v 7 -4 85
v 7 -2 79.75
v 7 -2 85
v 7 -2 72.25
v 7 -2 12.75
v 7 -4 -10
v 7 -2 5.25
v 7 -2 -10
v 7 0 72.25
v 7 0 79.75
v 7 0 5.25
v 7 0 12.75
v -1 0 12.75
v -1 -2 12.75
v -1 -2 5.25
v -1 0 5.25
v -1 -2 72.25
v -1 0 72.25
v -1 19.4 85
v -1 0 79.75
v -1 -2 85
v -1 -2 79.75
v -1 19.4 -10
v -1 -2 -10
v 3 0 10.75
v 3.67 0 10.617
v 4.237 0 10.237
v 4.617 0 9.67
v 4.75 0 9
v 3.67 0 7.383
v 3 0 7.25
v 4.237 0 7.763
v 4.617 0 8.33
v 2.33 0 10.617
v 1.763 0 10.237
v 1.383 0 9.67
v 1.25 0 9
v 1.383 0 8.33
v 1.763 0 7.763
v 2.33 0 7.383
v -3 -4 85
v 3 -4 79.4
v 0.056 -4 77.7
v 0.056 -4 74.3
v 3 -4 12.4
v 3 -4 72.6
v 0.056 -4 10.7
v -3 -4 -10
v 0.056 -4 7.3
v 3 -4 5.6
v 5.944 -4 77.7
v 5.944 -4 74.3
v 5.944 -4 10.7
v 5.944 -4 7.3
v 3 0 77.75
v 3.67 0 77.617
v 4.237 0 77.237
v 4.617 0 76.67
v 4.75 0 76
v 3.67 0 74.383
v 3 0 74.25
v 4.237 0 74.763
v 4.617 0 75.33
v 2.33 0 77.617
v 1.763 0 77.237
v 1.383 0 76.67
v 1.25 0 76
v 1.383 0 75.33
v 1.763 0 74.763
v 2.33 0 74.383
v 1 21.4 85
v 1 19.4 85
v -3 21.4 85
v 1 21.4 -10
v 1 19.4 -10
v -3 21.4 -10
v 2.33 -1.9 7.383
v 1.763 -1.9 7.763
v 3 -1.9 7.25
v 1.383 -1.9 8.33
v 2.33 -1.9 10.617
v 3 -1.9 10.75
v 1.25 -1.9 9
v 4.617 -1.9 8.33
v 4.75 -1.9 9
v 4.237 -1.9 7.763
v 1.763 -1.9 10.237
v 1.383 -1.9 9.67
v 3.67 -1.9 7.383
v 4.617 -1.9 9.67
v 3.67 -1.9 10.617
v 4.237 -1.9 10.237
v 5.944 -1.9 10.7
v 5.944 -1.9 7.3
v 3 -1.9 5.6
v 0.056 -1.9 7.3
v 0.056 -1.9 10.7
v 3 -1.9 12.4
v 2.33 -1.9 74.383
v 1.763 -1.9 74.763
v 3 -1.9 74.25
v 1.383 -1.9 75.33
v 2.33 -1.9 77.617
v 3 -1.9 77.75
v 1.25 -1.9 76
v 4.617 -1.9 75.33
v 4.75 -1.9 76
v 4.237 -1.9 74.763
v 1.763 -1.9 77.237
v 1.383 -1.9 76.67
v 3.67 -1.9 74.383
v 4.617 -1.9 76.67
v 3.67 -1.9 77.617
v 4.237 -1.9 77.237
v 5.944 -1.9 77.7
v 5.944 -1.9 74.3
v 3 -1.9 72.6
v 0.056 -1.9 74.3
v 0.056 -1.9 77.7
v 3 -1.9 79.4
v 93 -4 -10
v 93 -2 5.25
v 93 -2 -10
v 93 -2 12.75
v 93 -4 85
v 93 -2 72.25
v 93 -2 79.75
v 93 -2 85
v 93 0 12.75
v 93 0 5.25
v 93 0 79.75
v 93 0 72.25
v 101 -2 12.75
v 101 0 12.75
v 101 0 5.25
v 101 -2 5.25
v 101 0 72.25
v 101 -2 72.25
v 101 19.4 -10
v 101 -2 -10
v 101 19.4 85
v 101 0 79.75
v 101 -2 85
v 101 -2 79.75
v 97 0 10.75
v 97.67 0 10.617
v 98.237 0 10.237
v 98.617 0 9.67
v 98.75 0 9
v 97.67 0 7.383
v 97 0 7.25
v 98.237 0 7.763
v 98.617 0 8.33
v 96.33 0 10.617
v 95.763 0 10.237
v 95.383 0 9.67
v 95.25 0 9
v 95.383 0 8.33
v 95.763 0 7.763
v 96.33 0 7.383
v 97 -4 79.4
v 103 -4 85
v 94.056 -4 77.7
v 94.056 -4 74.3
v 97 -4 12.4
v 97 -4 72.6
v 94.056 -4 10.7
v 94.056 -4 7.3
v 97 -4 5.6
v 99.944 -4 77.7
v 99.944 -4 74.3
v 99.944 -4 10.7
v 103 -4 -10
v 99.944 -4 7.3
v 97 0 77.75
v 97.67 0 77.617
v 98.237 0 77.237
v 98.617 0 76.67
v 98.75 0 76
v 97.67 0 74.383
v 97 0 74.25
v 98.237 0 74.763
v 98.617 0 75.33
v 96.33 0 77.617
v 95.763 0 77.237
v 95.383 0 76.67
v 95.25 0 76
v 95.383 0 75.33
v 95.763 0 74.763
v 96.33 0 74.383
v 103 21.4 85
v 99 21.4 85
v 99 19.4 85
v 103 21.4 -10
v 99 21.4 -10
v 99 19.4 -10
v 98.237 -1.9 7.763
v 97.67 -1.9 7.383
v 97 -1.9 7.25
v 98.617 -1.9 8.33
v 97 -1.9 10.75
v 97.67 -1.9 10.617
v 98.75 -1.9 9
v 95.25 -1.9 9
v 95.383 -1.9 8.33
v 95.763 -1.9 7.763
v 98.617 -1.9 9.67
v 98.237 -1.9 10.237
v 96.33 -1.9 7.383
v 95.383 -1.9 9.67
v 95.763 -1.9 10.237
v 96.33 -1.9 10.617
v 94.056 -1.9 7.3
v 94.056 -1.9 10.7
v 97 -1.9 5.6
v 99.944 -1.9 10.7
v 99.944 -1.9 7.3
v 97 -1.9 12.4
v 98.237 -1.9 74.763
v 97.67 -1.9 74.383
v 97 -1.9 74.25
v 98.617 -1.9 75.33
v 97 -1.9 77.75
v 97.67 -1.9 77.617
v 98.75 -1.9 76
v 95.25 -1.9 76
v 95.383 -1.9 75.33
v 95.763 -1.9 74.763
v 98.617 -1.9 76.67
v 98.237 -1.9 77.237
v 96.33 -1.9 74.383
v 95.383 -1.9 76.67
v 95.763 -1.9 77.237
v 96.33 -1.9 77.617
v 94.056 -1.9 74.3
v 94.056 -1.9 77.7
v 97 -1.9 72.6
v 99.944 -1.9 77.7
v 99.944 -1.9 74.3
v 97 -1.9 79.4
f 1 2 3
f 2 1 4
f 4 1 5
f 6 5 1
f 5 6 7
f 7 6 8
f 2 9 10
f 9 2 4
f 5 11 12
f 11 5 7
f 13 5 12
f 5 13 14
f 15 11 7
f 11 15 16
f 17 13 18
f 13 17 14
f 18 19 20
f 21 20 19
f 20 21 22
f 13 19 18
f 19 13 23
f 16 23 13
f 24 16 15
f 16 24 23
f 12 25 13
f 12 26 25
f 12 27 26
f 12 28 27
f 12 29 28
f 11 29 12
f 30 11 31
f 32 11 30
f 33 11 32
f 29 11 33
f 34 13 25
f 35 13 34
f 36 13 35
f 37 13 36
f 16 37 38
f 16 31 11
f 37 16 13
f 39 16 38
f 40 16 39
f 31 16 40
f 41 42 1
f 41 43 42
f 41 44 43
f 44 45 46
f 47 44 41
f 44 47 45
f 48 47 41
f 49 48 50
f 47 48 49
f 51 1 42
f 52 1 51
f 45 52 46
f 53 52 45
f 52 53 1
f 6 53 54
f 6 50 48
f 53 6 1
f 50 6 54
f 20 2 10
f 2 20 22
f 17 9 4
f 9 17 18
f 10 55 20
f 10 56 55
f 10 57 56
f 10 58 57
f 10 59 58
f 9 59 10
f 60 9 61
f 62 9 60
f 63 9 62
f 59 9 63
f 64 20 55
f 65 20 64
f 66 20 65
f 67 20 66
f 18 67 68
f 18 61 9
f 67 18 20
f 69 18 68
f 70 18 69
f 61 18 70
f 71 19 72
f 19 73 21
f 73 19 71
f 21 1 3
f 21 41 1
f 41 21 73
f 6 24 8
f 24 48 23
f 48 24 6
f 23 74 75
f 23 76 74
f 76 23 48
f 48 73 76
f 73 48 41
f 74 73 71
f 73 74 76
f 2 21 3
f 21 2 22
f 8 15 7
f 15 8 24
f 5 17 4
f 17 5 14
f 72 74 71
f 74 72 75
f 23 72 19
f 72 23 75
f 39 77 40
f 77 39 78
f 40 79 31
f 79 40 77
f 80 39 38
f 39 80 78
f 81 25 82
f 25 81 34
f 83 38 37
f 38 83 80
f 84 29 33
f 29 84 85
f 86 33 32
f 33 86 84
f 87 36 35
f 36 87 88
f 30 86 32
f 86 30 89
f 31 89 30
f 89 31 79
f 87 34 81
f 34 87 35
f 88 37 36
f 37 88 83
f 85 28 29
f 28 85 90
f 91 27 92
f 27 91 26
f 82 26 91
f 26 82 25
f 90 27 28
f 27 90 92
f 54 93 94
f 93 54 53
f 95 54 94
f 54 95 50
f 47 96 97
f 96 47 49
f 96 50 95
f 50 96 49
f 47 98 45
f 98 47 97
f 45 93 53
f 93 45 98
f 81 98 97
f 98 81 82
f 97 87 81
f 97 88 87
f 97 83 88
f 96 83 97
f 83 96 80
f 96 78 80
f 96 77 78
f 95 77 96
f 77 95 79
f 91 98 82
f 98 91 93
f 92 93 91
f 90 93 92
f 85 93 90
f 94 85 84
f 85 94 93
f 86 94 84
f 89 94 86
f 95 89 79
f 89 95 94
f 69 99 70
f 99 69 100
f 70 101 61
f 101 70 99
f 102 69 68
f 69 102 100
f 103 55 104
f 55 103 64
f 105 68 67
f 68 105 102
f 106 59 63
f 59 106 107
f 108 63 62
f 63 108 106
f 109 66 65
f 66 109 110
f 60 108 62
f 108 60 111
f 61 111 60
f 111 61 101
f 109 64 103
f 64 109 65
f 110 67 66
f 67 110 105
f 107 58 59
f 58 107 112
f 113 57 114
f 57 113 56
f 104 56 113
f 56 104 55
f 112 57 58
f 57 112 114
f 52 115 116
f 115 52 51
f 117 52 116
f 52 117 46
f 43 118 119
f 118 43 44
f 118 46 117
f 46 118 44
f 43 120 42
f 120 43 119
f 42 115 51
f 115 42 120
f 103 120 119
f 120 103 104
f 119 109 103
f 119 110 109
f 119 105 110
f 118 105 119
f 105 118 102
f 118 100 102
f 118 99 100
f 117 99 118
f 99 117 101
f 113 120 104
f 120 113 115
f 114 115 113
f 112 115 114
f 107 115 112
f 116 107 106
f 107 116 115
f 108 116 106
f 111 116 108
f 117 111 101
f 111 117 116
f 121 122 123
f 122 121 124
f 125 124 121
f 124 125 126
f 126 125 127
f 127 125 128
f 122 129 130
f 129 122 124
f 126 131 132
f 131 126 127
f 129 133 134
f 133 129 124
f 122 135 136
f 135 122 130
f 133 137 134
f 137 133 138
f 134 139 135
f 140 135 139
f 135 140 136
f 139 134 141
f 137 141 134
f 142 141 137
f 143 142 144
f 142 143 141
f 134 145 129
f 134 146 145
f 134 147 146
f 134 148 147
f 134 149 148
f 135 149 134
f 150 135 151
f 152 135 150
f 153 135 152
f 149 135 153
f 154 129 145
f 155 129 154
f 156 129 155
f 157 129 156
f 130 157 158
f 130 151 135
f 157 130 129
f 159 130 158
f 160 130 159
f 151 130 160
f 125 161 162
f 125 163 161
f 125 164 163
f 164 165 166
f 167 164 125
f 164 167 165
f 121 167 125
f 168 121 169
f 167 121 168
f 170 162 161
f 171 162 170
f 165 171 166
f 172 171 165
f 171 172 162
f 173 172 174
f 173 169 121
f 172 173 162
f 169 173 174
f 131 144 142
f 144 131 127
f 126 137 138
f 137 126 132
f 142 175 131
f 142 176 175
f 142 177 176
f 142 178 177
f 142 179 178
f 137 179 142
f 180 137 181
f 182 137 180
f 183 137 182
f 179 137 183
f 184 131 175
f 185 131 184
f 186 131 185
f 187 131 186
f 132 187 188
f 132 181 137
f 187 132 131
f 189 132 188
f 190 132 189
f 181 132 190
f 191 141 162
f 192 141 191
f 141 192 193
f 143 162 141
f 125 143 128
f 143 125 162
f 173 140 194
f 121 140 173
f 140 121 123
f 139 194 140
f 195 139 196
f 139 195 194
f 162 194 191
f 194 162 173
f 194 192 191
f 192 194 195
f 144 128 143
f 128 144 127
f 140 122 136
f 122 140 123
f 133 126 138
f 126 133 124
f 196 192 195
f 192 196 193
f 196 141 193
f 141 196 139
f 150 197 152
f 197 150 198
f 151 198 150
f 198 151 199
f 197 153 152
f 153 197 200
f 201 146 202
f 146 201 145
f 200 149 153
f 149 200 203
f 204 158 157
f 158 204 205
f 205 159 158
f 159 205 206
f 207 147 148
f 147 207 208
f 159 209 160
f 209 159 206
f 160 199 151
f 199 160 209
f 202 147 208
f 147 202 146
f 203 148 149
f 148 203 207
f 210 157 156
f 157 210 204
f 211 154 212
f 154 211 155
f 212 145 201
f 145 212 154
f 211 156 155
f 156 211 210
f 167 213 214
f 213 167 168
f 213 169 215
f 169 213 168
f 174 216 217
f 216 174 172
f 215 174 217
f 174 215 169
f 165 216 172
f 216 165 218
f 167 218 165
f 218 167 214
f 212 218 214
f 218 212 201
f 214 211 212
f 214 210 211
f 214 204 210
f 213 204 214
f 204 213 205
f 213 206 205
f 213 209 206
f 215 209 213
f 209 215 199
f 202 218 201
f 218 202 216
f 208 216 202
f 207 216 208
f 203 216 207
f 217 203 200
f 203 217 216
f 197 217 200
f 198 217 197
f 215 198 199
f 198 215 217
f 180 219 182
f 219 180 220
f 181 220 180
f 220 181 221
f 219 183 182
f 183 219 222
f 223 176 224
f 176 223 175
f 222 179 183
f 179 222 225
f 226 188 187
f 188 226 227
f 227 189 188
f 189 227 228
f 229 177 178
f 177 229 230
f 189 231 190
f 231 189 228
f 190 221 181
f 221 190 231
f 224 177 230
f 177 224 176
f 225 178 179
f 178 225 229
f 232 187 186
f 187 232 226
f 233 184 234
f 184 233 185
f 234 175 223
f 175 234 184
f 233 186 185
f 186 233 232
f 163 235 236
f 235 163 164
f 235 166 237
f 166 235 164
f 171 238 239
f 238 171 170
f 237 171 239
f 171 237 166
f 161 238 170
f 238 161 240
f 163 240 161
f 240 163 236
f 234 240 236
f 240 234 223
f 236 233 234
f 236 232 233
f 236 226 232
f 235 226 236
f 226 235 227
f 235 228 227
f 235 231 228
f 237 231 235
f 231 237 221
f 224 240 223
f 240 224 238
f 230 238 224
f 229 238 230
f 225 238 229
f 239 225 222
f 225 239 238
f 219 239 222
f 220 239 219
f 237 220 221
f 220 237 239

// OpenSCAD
// file: ../library/linurs_screw.scad
// Metric screws and nuts 
// urs@linurs.org 2015
// It is targeted for 3D printing applications. 
// To look realistic is not the goal (Example: Nuts do not have a hole)

include <linurs_screw_dim.scad>

// Changes
//2019-02-09 split in two files
//2017-05-19 bug fix hexbolt had wrong diameter
//2017-01-22 bug fix lentgh of hex scre is outer lenght as other screw types
//2017-01-06 added hex screw
//2015-10-12 added screw_cut
//2015-11-29 screw_fix parameter sunk added, and module hex_bolt

// Consistent parameters in this file
// d screw diameter M2_5, M3, ... (enumeration with screw_d)
// t millimeters added to diameters 
//   For the screw, head, nut = 0. 
//   For the piece where the screw, nut, ... passes through = 0.5 so it slides in well

// functions used multiple times to position nuts and heads
function headh_cyl(d)=screw_cyl[d][1];  // height of cyl screw head
function headh_cnt(d)=screw_cyl[d][1];  // height of cnt screw head
function headh(d,type=head_cyl)=(type==head_cyl ? headh_cyl(d) : (type==head_cnt ? headh_cnt(d) : 0 )); // height of screw head 

function nuth(d)=screw_hex[d][2];   // height of hex nut

// head of a cylinder screw
module screw_head_cyl(d=M3, t=0)
{
  screwhd=screw_cyl[d][0]+t; // diameter of cylinder screw head
  cylinder(d=screwhd,h=headh(d=d, type=head_cyl), center=true,$fn=16); // screw head
}

// head of a countersunk screw
module screw_head_cnt(d=M3, t=0)
{
  screwd=screw_d[d]+t; 
  screwhd=screw_cnt[d][0]+t; // diameter of cylinder screw head
  cylinder(d1=screwd,d2=screwhd,h=headh(d=d,type=head_cnt), center=true,$fn=16); // screw head
}

// head of a hex screw
module screw_head_hex(d=M3, t=0)
{
    translate([0,0,-nuth(d)/2])nut(d=d, t=t);
}

// head of all screws
module screw_head(d=M3, type=head_cyl, t=0)
{ 
  if(type==head_cnt){
    screw_head_cnt(d=d, t=t);
  } else {
    if(type==head_cyl){
      screw_head_cyl(d=d, t=t);
    } else {
       if(type==head_hex){
           screw_head_hex(d=d, t=t); 
       } 
    }    
  }
}

// hex bolt 
module hex_bolt(d=M3, h=10, t=0)
{
  nutd=screw_hex[d][1]+t; // outer diameter of hex bolt
  cylinder(r=nutd/2,h=h+t, center=true,$fn=6); // nut
}

// nut 
module nut(d=M3, t=0)
{
  hex_bolt(d=d, h=nuth(d), t=t);    
}

// screw 
// w outer width of the screw = screw length + head 
module screw(w=10, d=M3, type=head_cyl, t=0){
  screwd=screw_d[d]+t;       // screw diameter
  cylinder(d=screwd, h=w, center=true,$fn=16); // screw thread length
  translate([0,0,w/2-headh(d=d,type=type)/2])
  screw_head(d=d,type=type, t=t);
}

// screw fix
// w outer width of the screw = screw length + head 
// sink additional material below to remove 
// raise additional material above to remove
module screw_fix(w=10, d=M3, type=head_cyl, sink=0, raise=0, t=0){
  screw(w=w-sink*2, d=d, type=type, t=t);
  translate([0,0,-(w-sink*2)/2+nuth(d)/2])
    nut(d=d,t=t);
  translate([0,0,-(w-sink+raise)/2])hex_bolt(d=d,h=sink+raise,t=t);    
  if(type==head_cnt){  
    translate([0,0,(w-sink+raise)/2])
    cylinder(d=screw_cnt[d][0]+t,h=sink+raise,center=true,$fn=16);
  }else{ 
    translate([0,0,(w-sink+raise)/2])
    cylinder(d=screw_cyl[d][0]+t,h=sink+raise,center=true,$fn=16);
  }     
}
//screw_fix();
//translate([10,0,0])screw_fix(sink=2,type=head_cnt);
//translate([-10,0,0])screw_fix(raise=2,type=head_cnt);

// screw cut
// material to be extracted from object to slide in a counter sunk screw for fixation
// w height of the cut out
// i depth of the screw
module screw_cut(d=M3,w=20,i=10,t=0,fn=32){
    hsh=screw_cnt[d][1];
    ws=screw_cnt[d][0]+t;
    ds=screw_d[d]+t;
    
    translate([i/2,0,-(w-hsh)/2])
      cube([i,ws,hsh],center=true);
    
    translate([0,0,-(w-hsh)/2])
      cylinder(d=ws,h=hsh,center=true,$fn=32);
    
    translate([0,0,-(w-hsh)/2+hsh])
        cylinder(d2=ds, d1=ws, h=hsh,center=true,$fn=fn);
    
    cylinder(h=w, d=ds, center=true, $fn=fn);   
    
    translate([i/2,0,0]) 
        cube([i,ds,w],center=true);
    
    for(y=[-1,1]){
        translate([i/2,y*ds/2,-w/2+hsh])
            rotate([45,0,0])
            cube([i,sqrt(2)*(ws-ds)/2,sqrt(2)*(ws-ds)/2],center=true);
    }
}
//screw_cut();

// nut cut
// material to be extracted from object to slide in a nut for fixation
// w height of the cylinder
// i lenght of the inlet
module nut_cut(w=10, wi=0, d=M3, i=10, t=0, raise=0, type=head_cyl){ 
  nut(d,t);
  translate([i/2,0,0])
    cube([i,screw_hex[d][0]+t,nuth(d)+t],center=true);
  translate([0,0,-wi])
      if(type==head_cnt){    
          screw(w=w, d=d, type=type, t=t); 
        translate([0,0,(w+raise)/2-0.01])
          cylinder(d=screw_cnt[d][0]+t,h=raise,center=true,$fn=16);
      }else{ 
          screw(w=w, d=d, type=type, t=t);   
        translate([0,0,(w+raise)/2-0.01])
          cylinder(d=screw_cyl[d][0]+t,h=raise,center=true,$fn=16);
      }       
}
//
nut_cut(raise=2,type=head_cnt,i=14,w=20,wi=2, t=1);

// present the library
show=0;

if(show==1){
    grid=20;
    
    for (j=[0:10]){
        for (i=[0:3])
           translate([j*grid,i*grid,0]){  
           
    // elements           
           if(j==0){
             screw_fix(w=(i+2)*5,d=i, type=head_cyl, t=0);
           }
       
           if(j==1){
             nut(d=i,t=0);
           } 
       
           if(j==2){   
              screw(d=i,t=0);
           } 
           
           if(j==3){   
              screw(d=i,t=0,type=head_cnt);
           } 
           
           if(j==4){   
              screw(d=i,t=0,type=head_hex);
           } 
           
           if(j==5){   
              hex_bolt(d=i,t=0);
           } 
           
       }
    }   
     
    for (j=[0:2]){
        for (i=[0:3])
           translate([j*grid,-(i+1)*grid,0]){  
             difference(){
                cube([3*screw_d[i],3*screw_d[i],(i+2)*5-0.1],center=true);    
    
                if(j==0){
                  screw_fix(w=(i+2)*5,d=i,type=head_cnt, t=0.5);
                }   
                
                if(j==1){
                  nut_cut(d=i,w=(i+2)*5);
                }
                if(j==2){
                  screw_cut(d=1,w=(i+2)*5);
                }
            
             }
           }  
        
    }
}
   
// file: ../library/linurs_screw_dim.scad
// Metric screws and nuts 
// urs@linurs.org 2015

// contains dimensions of linurs_screw and can be included in other 
// OpenScad files 


// Consistent parameters in this file
// d screw diameter M2_5, M3, ... (enumeration with screw_d)
// t millimeters added to diameters 
//   For the screw, head, nut = 0. 
//   For the piece where the screw, nut, ... passes through = 0.5 so it slides in well

// enumerations of metric threads
M2_5=0;
M3=1;
M4=2;
M5=3;

// enumerations screw head type
head_cyl=0; // cylinder
head_cnt=1; // countrsunk
head_no=2;  // no head at all
head_hex=3;  // no head at all

// screw diameters
screw_d=[
2.5, // M2.5
3.0, // M3
4.0, // M4
5.0  // M5
];

// sizes for hex nuts
screw_hex=[
//   s,   e,   h
 [ 5.0, 5.8, 1.7], // M2.5
 [ 5.5, 6.4, 2.0], // M3
 [ 7.0, 8.1, 2.8], // M4
 [ 8.0, 9.2, 3.5]  // M5
];

// sizes for cylinder screw heads
screw_cyl=[
//   d,   h
 [ 4.5, 1.6], // M2.5
 [ 5.5, 2.0], // M3
 [ 7.0, 2.6], // M4
 [ 8.5, 3.3]  // M5
];

// sizes for countersunk screw heads
screw_cnt=[
//   d,   h
 [ 4.7, 1.50], // M2.5
 [ 5.6, 1.65], // M3
 [ 7.4, 2.20], // M4
 [ 9.2, 2.50]  // M5
];
// file: ../motherboard/motherboard_dim.scad
// motherboard pcb dimensions
motherboard_w=100;   // pcb width
motherboard_t=1.6;   // pcb thickness
motherboard_pass=0.5;// gap to fit screws 
step=25.4;           // distance between modules

// connector dimensions
motherboard_con_head_w=85;  // width of the connector head
motherboard_con_head_d=8.5; // depth of the connector head
motherboard_con_w=95;       // largest width of the connector
motherboard_con_h=11.6;     // largest height of the connector
motherboard_con_t=11;       // largest depth of the connector
motherboard_con_d_w=90;     // distance between mounting holes
motherboard_con_d=2.8;      // diameter of mounting holes
motherboard_con_out=5.2;    // height produced by the connector when pulgged in 

// pcb module connector dimension
pcbmodule_con_out=13-(5.3+2.8-2.54);  // distance connector sticks out of pcb

// offset
motherboard_z_offset= -(pcbmodule_con_out+motherboard_con_out+motherboard_t); // z offset motherboard built in
// file: pcbmodule_dim.scad
include <../library/linurs_screw_dim.scad>
include <../motherboard/motherboard_dim.scad>
// pcb constants
pcb_h=80;              // height of the pcb
pcb_thick=1.6;         // thickness
pcb_x1=3;              // position mounting holes
pcb_x2=97;
pcb_y1=9;
pcb_y2=76;
pcb_d=3;               // diameter of holes

// bracket constants
bracket_t=2;           // thickness of bracket
bracket_x1=10;         // depth of the U shape at the side of the screw
bracket_x2=4;          // depth of the U shape at the side where no screw is  
bracket_h=pcb_h+15;    // height of bracket
bracket_hole_cube_h=4; // height of the mounting hole cube
bracket_screw=M2_5;    // hole for the screw

// bracket offsets
bracket_offset_x=-3;   // bracket offset in elecbox x axis (adding gap)
bracket_offset_z=-10;  // bracket offset in elecbox z axis

// pcb module dimensions
pcbmodule_w=(-bracket_offset_x)*2+motherboard_w; // depth of the module
pcbmodule_h=bracket_h;                           // hight of the module   
pcbmodule_l=step;                                // width of the module   

screw_t=1; //mm added so screws fit into holes
olp=0.1; // overlapp distance to produce nice body after difference() 
// main file
// bracket
// A bracket of the elecbox module
// - type: 0 front bracket, 1 rear bracket
// - width 1..n in steps
// - var: 0 do not create intermediate mounting holes, 1 create intermediate mounting holes 

include <pcbmodule_dim.scad>
include <../motherboard/motherboard_dim.scad>
include <../library/linurs_screw_dim.scad>

use <../library/linurs_screw.scad>


module bracket(type=0, width=1, var=0){
  echo("bracket");  
  color("White")
  translate([type*motherboard_w,
             0,
             0])  // move mirrored bracket in position if desired
  mirror([type*1,0,0])       // mirror it if desired
  difference(){
    union(){
      for(x=[1:width]){  // create the mounting hole cubes 
        for(z=[pcb_y1,pcb_y2]){
          translate([pcb_x1,
                     (x-1)*step*var-bracket_hole_cube_h/2,
                     z])
          cube([bracket_x1-bracket_t,bracket_hole_cube_h,3*screw_d[bracket_screw]],center=true);
        }
      }

      translate([bracket_t/2+bracket_offset_x,
                 step/2*width-bracket_hole_cube_h,
                 bracket_h/2+bracket_offset_z])  
      cube([bracket_t,step*width,bracket_h],center=true);  // create the bracket front


      translate([bracket_x1/2+bracket_offset_x,
                 bracket_t/2-bracket_hole_cube_h,
                 bracket_h/2+bracket_offset_z]) 
      cube([bracket_x1,bracket_t,bracket_h],center=true);  // create the bracket mounting


      translate([bracket_x2/2+bracket_offset_x,
                 bracket_t/2-bracket_hole_cube_h+step*width-bracket_t,
                 bracket_h/2+bracket_offset_z]) 
      cube([bracket_x2,bracket_t,bracket_h],center=true);  // create the bracket mounting


    }
    for(x=[1:width]){ // create the mounting hole 
      for(z=[pcb_y1,pcb_y2]){
        translate([pcb_x1,
                   (x-1)*step*var-olp,
                   z])
        rotate([0,90,0])
        rotate([-90,0,0])
        screw_fix(w=2*bracket_hole_cube_h,d=bracket_screw,type=head_no, t=screw_t);
      }
    }
  }
}

// to show
//bracket(type=1, width=2, var=1);
//
bracket();
bracket(type=1);
//

// to print
//rotate([0,-90,0])bracket(type=0);
//rotate([0,90,0]) bracket(type=1);
//bracket(type=0);

module arduino(){
    difference(){
        bracket(type=0);
        translate([0,1+12/2,52.5+13/2])cube([20,12,13],center=true);
        translate([0,1+12/2,24+10/2])cube([20,12,10],center=true);
        translate([0,1+12+2/2,21.5+54/2])cube([20,2,54],center=true);
    }
}
//rotate([0,-90,0])
//arduino();

module 3DprinterIOfront(){
    difference(){
        bracket(type=0);
        translate([0,11/2,37.5+34/2])cube([20,11,34],center=true);        
    }
}
//rotate([0,-90,0])
//3DprinterIOfront();

module 3DprinterIOback(){
    difference(){
        translate([-100,0,0])bracket(type=1);
        translate([0,14/2,12+31/2])cube([20,14,31],center=true); 
        translate([0,14/2,53.5+18.5/2])cube([20,14,18.5],center=true);               
    }
}
//rotate([0,90,0])
//3DprinterIOback();

module Fetback(){
    difference(){
        translate([-100,0,0])bracket(type=1);
        translate([0,14/2,15+51/2])cube([20,14,51],center=true); 
       
    }
}
//rotate([0,90,0])
//Fetback();

module Stepperback(){
    difference(){
        translate([-100,0,0])bracket(type=1);
        translate([0,14/2,15+14/2])cube([20,14,14],center=true); 
        translate([0,14/2,30+14/2])cube([20,14,14],center=true); 
        translate([0,14/2,45+14/2])cube([20,14,14],center=true); 
        translate([0,14/2,60+14/2])cube([20,14,8],center=true); 
            
    }
}
//rotate([0,90,0])
//Stepperback();

module Stepperfront(){
    difference(){
        bracket(type=0);
        translate([0,14/2,15+14/2])cube([20,14,14],center=true); 
        translate([0,14/2,30+14/2])cube([20,14,14],center=true);    
       translate([0,14/2,60+14/2])cube([20,14,8],center=true);      
    }
}
//rotate([0,-90,0])
//Stepperfront();

module I2Cback(){
    difference(){
        translate([-100,0,0])bracket(type=1);
        translate([0,12/2,31+13/2])cube([20,12,13],center=true);       
    }
}
//rotate([0,90,0])
//I2Cback();

module I2Cfront(){
    difference(){
        bracket(type=0);
        translate([0,13/2,21+25/2])cube([20,13,25],center=true); 
        translate([0,5,49])rotate([0,90,0])cylinder(h=20,d=5.5,center=true, $fn=16);    
        translate([0,5,57])rotate([0,90,0])cylinder(h=20,d=5.5,center=true, $fn=16);      
    }
}
//rotate([0,-90,0])
//I2Cfront();

module MCP2221back(){
    h=12;
    w=13;
    z=31;
    difference(){
        translate([-100,0,0])bracket(type=1);
        translate([0,h/2+pcb_thick,z+w/2])cube([20,h,w],center=true);       
    }
}
//rotate([0,90,0])
//MCP2221back();

module MCP2221front(){
    h1=12;
    w1=12;
    z1=29;
    d2=4;
    h2=3;
    z2=66;
    difference(){
        bracket(type=0);
        translate([0,h1/2+pcb_thick,z1+w1/2])cube([20,h1,w1],center=true); 
        translate([0,h2+pcb_thick,z2])rotate([0,90,0])cylinder(h=20,d=d2,center=true, $fn=16);          
    }
}
//rotate([0,-90,0])
//MCP2221front();
